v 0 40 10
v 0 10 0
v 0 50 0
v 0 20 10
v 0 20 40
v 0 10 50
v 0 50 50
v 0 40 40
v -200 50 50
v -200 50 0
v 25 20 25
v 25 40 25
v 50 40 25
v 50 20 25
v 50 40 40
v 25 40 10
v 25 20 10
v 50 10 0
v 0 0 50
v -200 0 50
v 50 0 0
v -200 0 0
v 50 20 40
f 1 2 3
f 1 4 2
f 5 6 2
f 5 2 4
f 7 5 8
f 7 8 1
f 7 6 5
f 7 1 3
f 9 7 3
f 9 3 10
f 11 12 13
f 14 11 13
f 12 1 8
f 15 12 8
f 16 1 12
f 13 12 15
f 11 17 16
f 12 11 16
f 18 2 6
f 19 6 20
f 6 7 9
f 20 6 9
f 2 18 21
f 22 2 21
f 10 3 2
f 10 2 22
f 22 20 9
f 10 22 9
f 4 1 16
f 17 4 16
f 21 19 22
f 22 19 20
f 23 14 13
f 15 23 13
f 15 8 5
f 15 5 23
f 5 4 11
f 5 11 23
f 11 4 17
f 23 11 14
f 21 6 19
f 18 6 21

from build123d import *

# Parameters (mm, degrees)
BOX004_W               = 25
BOX004_H               = 20
BOX004_DEPTH           = 20
BOX002_W               = 200
BOX002_H               = 50
BOX002_DEPTH           = 50
BOX003_W               = 50
BOX003_H               = 20
BOX003_DEPTH           = 30
BOX001_W               = 100
BOX001_H               = 10
BOX001_DEPTH           = 100
BOX001_PLACEMENT_ANGLE = 45
BOX_W                  = 50
BOX_H                  = 10
BOX_DEPTH              = 50


with BuildPart() as cube004:
    # Box004 → Box004 (new body)
    with BuildSketch(Plane(origin=(25, 20, 5), x_dir=(1, 0, 0), z_dir=(0, 0, 1))):
        with Locations((12.5, 10)):
            Rectangle(BOX004_W, BOX004_H)
    extrude(amount=BOX004_DEPTH)


with BuildPart() as cube002:
    # Box002 → Box002 (new body)
    with BuildSketch(Plane(origin=(0, 0, 50), x_dir=(-1, 0, 0), z_dir=(0, 0, -1))):
        with Locations((100, 25)):
            Rectangle(BOX002_W, BOX002_H)
    extrude(amount=BOX002_DEPTH)


with BuildPart() as cube003:
    # Box003 → Box003 (new body)
    with BuildSketch(Plane(origin=(0, 20, 10), x_dir=(1, 0, 0), z_dir=(0, 0, 1))):
        with Locations((25, 10)):
            Rectangle(BOX003_W, BOX003_H)
    extrude(amount=BOX003_DEPTH)


with BuildPart() as cube001:
    # Box001 → Box001 (new body)
    with BuildSketch(Plane.XY):
        with Locations((50, 5)):
            Rectangle(BOX001_W, BOX001_H)
    extrude(amount=BOX001_DEPTH)


with BuildPart() as cube001_1:
    # Box001 placement: moved
    add(cube001.part.moved(Location((0, 0, 50))).rotate(Axis((0, 0, 50), (0, 1, 0)), BOX001_PLACEMENT_ANGLE))


with BuildPart() as cut001:
    # Box → Box (new body)
    with BuildSketch(Plane.XY):
        with Locations((25, 5)):
            Rectangle(BOX_W, BOX_H)
    extrude(amount=BOX_DEPTH)

    # Cut: cut Cube001
    add(cube001_1.part, mode=Mode.SUBTRACT)

    # Fusion: union Cube002, Cube003
    add(cube002.part)
    add(cube003.part)

    # Cut001: cut Cube004
    add(cube004.part, mode=Mode.SUBTRACT)


solid = cut001.part
